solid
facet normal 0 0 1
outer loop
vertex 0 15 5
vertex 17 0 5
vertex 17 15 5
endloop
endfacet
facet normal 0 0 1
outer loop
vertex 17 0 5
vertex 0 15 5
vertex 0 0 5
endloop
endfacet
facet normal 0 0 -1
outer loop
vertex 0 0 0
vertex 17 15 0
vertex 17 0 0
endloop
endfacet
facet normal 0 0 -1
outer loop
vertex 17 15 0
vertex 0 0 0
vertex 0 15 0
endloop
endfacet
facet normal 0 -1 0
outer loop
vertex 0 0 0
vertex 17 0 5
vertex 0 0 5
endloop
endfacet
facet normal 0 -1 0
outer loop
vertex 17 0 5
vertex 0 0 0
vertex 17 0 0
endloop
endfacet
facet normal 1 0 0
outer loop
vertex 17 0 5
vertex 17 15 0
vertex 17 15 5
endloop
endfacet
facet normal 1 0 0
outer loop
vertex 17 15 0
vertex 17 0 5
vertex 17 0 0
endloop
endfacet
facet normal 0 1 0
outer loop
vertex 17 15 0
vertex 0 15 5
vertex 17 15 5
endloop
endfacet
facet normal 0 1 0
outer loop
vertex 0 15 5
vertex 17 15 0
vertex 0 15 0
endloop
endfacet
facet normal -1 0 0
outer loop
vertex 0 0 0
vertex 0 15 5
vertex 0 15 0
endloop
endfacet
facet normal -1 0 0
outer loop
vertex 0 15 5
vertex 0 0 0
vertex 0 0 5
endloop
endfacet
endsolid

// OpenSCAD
// Generated by SolidPython 1.0.1 on 2020-07-29 00:46:56


cube(size = [17, 15, 5]);
/***********************************************
*********      SolidPython code:      **********
************************************************
 
# import packages: SolidPython
from solid import *
from solid.utils import *
from itertools import chain, combinations, permutations


class Resize:

    def __init__(self, scad_file):
        self.scad_file = scad_file
        #self.scad_file = import_scad(scad_file)
        # cone/cylinder param:
        self.r1 = 0
        self.r2 = 0
        self.h = 0
        # rectangular prism param:
        self.w = 0
        self.l = 0
        # ellipse param:
        self.r = 0

    # import OpenScad code (file name corresponds to shape)


    # classify shape + parameters
    def assign(self, param1, param2, param3):
        if self.scad_file == 'cone.scad':
            self.r1 = param1
            self.r2 = param2
            self.h = param3
        elif self.scad_file == 'cylinder.scad':
            self.r1 = param1
            self.r2 = param2
            self.h = param3
        elif self.scad_file == 'rectangularPrism.scad':
            self.h = param1
            self.l = param2
            self.w = param3
        else:
            self.r = param1
            self.h = param2

    # resize parameters
    def iterate(self):
        x = range(3, 20, 2)
        i = 1
        if self.scad_file == 'cone.scad':
            tempList = list(permutations(x, 2))
            for temp in tempList:
                param1 = temp[0]
                param2 = temp[1]
                filepath = 'produced_scad_files/' + 'cone' + str(param1) + '_' + str(param2) + '_' + '.scad'
                scad_render_to_file(cylinder(h=param1, r1=param2, r2=0), filepath)

        elif self.scad_file == 'cylinder.scad':
            tempList = list(permutations(x, 3))
            for temp in tempList:
                param1 = temp[0]
                param2 = temp[1]
                filepath = 'produced_scad_files/' + 'cylinder' + str(param1) + '_' + str(param2) + '_' + '.scad'
                scad_render_to_file(cylinder(h=param1, r1=param2, r2=param2), filepath)

        elif self.scad_file == 'rectangularPrism.scad':
            tempList = list(permutations(x, 3))
            for temp in tempList:
                param1 = temp[0]
                param2 = temp[1]
                param3 = temp[2]
                filepath = 'produced_scad_files/' + 'rectangularPrism' + str(param1) + '_' + str(param2) + '_' + str(
                    param3) + '.scad'
                scad_render_to_file(cube(size=(param1, param2, param3)), filepath)

        elif self.scad_file == 'ellipse.scad':
            tempList = list(permutations(x, 4))
            for temp in tempList:
                param1 = temp[0]
                param2 = temp[1]
                param3 = temp[2]
                param4 = temp[3]
                filepath = 'produced_scad_files/' + 'ellipse' + str(param1) + '_' + str(param2) + '_' + str(param3) + '_' + str(param4) + '.scad'
                scad_render_to_file(scale([param1, param2, param3])(sphere(r=param4)), filepath)

    def render_to_scadfile(self):
        scad_render_to_file(scad, 'example.scad') 
 
************************************************/
